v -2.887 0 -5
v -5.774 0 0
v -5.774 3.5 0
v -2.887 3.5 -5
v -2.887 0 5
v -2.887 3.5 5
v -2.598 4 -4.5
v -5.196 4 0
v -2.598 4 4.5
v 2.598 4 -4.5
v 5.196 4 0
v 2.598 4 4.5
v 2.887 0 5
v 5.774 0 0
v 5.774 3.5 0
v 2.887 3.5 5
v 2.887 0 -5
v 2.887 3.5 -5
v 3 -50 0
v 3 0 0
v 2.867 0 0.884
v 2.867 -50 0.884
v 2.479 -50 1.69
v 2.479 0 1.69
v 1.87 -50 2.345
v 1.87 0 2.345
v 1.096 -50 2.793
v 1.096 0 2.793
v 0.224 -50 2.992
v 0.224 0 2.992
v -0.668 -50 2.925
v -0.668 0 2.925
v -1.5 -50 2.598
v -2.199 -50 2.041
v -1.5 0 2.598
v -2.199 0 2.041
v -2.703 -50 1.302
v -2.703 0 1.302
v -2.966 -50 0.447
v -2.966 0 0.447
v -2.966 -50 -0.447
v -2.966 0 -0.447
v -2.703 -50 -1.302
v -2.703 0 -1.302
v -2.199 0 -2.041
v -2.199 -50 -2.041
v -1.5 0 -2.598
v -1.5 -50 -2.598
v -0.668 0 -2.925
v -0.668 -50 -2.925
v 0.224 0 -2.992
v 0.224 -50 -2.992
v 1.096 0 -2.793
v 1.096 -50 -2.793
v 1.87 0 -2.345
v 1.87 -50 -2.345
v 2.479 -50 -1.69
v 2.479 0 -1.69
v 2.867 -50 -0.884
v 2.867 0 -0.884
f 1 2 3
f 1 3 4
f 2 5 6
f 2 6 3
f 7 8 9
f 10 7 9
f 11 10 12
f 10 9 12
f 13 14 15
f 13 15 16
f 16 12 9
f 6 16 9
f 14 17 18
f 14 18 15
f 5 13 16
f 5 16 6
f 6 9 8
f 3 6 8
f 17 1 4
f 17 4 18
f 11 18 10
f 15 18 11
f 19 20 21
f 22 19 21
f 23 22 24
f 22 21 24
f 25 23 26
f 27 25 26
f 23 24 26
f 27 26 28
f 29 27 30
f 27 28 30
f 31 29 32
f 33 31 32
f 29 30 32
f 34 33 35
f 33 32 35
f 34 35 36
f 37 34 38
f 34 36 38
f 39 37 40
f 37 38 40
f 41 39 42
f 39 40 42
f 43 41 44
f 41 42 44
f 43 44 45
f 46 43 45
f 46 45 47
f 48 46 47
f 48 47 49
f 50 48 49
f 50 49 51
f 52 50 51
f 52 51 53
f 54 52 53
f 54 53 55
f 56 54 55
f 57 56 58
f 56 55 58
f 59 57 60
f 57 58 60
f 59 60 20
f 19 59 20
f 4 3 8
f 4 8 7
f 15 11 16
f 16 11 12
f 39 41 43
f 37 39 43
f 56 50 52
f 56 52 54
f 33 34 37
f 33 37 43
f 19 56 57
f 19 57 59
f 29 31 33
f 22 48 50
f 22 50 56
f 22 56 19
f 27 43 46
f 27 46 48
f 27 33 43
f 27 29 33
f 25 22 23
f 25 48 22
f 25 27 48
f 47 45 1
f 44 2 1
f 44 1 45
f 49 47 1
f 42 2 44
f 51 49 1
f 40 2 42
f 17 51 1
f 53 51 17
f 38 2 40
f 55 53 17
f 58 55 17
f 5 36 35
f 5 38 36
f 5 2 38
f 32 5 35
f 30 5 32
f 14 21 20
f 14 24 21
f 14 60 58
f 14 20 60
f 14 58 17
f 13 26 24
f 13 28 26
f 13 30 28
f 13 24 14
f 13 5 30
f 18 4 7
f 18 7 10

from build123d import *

# Parameters (mm, degrees)
F1_DEPTH = 4
F2_R     = 3
F3_DEPTH = 50
F4_SIZE  = 0.5


with BuildPart() as f1:
    # F0 (on Front) → F1 (new body)
    with BuildSketch(Plane.XZ):
        Polygon((2.886751, 5), (-2.886751, 5), (-5.773503, 0), (-2.886751, -5), (2.886751, -5), (5.773503, 0), align=None)
    extrude(amount=-F1_DEPTH)

    # F2 (on face) → F3 (join)
    with BuildSketch(Plane.XZ):
        Circle(F2_R)
    extrude(amount=F3_DEPTH)

    # F4
    f4_edges = [f1.edges().sort_by_distance(p)[0] for p in [
        (4.330127, 4, 2.5),
        (0, 4, 5),
        (-4.330127, 4, 2.5),
        (-4.330127, 4, -2.5),
        (0, 4, -5),
        (4.330127, 4, -2.5),
    ]]
    chamfer(f4_edges, length=F4_SIZE)


solid = f1.part
